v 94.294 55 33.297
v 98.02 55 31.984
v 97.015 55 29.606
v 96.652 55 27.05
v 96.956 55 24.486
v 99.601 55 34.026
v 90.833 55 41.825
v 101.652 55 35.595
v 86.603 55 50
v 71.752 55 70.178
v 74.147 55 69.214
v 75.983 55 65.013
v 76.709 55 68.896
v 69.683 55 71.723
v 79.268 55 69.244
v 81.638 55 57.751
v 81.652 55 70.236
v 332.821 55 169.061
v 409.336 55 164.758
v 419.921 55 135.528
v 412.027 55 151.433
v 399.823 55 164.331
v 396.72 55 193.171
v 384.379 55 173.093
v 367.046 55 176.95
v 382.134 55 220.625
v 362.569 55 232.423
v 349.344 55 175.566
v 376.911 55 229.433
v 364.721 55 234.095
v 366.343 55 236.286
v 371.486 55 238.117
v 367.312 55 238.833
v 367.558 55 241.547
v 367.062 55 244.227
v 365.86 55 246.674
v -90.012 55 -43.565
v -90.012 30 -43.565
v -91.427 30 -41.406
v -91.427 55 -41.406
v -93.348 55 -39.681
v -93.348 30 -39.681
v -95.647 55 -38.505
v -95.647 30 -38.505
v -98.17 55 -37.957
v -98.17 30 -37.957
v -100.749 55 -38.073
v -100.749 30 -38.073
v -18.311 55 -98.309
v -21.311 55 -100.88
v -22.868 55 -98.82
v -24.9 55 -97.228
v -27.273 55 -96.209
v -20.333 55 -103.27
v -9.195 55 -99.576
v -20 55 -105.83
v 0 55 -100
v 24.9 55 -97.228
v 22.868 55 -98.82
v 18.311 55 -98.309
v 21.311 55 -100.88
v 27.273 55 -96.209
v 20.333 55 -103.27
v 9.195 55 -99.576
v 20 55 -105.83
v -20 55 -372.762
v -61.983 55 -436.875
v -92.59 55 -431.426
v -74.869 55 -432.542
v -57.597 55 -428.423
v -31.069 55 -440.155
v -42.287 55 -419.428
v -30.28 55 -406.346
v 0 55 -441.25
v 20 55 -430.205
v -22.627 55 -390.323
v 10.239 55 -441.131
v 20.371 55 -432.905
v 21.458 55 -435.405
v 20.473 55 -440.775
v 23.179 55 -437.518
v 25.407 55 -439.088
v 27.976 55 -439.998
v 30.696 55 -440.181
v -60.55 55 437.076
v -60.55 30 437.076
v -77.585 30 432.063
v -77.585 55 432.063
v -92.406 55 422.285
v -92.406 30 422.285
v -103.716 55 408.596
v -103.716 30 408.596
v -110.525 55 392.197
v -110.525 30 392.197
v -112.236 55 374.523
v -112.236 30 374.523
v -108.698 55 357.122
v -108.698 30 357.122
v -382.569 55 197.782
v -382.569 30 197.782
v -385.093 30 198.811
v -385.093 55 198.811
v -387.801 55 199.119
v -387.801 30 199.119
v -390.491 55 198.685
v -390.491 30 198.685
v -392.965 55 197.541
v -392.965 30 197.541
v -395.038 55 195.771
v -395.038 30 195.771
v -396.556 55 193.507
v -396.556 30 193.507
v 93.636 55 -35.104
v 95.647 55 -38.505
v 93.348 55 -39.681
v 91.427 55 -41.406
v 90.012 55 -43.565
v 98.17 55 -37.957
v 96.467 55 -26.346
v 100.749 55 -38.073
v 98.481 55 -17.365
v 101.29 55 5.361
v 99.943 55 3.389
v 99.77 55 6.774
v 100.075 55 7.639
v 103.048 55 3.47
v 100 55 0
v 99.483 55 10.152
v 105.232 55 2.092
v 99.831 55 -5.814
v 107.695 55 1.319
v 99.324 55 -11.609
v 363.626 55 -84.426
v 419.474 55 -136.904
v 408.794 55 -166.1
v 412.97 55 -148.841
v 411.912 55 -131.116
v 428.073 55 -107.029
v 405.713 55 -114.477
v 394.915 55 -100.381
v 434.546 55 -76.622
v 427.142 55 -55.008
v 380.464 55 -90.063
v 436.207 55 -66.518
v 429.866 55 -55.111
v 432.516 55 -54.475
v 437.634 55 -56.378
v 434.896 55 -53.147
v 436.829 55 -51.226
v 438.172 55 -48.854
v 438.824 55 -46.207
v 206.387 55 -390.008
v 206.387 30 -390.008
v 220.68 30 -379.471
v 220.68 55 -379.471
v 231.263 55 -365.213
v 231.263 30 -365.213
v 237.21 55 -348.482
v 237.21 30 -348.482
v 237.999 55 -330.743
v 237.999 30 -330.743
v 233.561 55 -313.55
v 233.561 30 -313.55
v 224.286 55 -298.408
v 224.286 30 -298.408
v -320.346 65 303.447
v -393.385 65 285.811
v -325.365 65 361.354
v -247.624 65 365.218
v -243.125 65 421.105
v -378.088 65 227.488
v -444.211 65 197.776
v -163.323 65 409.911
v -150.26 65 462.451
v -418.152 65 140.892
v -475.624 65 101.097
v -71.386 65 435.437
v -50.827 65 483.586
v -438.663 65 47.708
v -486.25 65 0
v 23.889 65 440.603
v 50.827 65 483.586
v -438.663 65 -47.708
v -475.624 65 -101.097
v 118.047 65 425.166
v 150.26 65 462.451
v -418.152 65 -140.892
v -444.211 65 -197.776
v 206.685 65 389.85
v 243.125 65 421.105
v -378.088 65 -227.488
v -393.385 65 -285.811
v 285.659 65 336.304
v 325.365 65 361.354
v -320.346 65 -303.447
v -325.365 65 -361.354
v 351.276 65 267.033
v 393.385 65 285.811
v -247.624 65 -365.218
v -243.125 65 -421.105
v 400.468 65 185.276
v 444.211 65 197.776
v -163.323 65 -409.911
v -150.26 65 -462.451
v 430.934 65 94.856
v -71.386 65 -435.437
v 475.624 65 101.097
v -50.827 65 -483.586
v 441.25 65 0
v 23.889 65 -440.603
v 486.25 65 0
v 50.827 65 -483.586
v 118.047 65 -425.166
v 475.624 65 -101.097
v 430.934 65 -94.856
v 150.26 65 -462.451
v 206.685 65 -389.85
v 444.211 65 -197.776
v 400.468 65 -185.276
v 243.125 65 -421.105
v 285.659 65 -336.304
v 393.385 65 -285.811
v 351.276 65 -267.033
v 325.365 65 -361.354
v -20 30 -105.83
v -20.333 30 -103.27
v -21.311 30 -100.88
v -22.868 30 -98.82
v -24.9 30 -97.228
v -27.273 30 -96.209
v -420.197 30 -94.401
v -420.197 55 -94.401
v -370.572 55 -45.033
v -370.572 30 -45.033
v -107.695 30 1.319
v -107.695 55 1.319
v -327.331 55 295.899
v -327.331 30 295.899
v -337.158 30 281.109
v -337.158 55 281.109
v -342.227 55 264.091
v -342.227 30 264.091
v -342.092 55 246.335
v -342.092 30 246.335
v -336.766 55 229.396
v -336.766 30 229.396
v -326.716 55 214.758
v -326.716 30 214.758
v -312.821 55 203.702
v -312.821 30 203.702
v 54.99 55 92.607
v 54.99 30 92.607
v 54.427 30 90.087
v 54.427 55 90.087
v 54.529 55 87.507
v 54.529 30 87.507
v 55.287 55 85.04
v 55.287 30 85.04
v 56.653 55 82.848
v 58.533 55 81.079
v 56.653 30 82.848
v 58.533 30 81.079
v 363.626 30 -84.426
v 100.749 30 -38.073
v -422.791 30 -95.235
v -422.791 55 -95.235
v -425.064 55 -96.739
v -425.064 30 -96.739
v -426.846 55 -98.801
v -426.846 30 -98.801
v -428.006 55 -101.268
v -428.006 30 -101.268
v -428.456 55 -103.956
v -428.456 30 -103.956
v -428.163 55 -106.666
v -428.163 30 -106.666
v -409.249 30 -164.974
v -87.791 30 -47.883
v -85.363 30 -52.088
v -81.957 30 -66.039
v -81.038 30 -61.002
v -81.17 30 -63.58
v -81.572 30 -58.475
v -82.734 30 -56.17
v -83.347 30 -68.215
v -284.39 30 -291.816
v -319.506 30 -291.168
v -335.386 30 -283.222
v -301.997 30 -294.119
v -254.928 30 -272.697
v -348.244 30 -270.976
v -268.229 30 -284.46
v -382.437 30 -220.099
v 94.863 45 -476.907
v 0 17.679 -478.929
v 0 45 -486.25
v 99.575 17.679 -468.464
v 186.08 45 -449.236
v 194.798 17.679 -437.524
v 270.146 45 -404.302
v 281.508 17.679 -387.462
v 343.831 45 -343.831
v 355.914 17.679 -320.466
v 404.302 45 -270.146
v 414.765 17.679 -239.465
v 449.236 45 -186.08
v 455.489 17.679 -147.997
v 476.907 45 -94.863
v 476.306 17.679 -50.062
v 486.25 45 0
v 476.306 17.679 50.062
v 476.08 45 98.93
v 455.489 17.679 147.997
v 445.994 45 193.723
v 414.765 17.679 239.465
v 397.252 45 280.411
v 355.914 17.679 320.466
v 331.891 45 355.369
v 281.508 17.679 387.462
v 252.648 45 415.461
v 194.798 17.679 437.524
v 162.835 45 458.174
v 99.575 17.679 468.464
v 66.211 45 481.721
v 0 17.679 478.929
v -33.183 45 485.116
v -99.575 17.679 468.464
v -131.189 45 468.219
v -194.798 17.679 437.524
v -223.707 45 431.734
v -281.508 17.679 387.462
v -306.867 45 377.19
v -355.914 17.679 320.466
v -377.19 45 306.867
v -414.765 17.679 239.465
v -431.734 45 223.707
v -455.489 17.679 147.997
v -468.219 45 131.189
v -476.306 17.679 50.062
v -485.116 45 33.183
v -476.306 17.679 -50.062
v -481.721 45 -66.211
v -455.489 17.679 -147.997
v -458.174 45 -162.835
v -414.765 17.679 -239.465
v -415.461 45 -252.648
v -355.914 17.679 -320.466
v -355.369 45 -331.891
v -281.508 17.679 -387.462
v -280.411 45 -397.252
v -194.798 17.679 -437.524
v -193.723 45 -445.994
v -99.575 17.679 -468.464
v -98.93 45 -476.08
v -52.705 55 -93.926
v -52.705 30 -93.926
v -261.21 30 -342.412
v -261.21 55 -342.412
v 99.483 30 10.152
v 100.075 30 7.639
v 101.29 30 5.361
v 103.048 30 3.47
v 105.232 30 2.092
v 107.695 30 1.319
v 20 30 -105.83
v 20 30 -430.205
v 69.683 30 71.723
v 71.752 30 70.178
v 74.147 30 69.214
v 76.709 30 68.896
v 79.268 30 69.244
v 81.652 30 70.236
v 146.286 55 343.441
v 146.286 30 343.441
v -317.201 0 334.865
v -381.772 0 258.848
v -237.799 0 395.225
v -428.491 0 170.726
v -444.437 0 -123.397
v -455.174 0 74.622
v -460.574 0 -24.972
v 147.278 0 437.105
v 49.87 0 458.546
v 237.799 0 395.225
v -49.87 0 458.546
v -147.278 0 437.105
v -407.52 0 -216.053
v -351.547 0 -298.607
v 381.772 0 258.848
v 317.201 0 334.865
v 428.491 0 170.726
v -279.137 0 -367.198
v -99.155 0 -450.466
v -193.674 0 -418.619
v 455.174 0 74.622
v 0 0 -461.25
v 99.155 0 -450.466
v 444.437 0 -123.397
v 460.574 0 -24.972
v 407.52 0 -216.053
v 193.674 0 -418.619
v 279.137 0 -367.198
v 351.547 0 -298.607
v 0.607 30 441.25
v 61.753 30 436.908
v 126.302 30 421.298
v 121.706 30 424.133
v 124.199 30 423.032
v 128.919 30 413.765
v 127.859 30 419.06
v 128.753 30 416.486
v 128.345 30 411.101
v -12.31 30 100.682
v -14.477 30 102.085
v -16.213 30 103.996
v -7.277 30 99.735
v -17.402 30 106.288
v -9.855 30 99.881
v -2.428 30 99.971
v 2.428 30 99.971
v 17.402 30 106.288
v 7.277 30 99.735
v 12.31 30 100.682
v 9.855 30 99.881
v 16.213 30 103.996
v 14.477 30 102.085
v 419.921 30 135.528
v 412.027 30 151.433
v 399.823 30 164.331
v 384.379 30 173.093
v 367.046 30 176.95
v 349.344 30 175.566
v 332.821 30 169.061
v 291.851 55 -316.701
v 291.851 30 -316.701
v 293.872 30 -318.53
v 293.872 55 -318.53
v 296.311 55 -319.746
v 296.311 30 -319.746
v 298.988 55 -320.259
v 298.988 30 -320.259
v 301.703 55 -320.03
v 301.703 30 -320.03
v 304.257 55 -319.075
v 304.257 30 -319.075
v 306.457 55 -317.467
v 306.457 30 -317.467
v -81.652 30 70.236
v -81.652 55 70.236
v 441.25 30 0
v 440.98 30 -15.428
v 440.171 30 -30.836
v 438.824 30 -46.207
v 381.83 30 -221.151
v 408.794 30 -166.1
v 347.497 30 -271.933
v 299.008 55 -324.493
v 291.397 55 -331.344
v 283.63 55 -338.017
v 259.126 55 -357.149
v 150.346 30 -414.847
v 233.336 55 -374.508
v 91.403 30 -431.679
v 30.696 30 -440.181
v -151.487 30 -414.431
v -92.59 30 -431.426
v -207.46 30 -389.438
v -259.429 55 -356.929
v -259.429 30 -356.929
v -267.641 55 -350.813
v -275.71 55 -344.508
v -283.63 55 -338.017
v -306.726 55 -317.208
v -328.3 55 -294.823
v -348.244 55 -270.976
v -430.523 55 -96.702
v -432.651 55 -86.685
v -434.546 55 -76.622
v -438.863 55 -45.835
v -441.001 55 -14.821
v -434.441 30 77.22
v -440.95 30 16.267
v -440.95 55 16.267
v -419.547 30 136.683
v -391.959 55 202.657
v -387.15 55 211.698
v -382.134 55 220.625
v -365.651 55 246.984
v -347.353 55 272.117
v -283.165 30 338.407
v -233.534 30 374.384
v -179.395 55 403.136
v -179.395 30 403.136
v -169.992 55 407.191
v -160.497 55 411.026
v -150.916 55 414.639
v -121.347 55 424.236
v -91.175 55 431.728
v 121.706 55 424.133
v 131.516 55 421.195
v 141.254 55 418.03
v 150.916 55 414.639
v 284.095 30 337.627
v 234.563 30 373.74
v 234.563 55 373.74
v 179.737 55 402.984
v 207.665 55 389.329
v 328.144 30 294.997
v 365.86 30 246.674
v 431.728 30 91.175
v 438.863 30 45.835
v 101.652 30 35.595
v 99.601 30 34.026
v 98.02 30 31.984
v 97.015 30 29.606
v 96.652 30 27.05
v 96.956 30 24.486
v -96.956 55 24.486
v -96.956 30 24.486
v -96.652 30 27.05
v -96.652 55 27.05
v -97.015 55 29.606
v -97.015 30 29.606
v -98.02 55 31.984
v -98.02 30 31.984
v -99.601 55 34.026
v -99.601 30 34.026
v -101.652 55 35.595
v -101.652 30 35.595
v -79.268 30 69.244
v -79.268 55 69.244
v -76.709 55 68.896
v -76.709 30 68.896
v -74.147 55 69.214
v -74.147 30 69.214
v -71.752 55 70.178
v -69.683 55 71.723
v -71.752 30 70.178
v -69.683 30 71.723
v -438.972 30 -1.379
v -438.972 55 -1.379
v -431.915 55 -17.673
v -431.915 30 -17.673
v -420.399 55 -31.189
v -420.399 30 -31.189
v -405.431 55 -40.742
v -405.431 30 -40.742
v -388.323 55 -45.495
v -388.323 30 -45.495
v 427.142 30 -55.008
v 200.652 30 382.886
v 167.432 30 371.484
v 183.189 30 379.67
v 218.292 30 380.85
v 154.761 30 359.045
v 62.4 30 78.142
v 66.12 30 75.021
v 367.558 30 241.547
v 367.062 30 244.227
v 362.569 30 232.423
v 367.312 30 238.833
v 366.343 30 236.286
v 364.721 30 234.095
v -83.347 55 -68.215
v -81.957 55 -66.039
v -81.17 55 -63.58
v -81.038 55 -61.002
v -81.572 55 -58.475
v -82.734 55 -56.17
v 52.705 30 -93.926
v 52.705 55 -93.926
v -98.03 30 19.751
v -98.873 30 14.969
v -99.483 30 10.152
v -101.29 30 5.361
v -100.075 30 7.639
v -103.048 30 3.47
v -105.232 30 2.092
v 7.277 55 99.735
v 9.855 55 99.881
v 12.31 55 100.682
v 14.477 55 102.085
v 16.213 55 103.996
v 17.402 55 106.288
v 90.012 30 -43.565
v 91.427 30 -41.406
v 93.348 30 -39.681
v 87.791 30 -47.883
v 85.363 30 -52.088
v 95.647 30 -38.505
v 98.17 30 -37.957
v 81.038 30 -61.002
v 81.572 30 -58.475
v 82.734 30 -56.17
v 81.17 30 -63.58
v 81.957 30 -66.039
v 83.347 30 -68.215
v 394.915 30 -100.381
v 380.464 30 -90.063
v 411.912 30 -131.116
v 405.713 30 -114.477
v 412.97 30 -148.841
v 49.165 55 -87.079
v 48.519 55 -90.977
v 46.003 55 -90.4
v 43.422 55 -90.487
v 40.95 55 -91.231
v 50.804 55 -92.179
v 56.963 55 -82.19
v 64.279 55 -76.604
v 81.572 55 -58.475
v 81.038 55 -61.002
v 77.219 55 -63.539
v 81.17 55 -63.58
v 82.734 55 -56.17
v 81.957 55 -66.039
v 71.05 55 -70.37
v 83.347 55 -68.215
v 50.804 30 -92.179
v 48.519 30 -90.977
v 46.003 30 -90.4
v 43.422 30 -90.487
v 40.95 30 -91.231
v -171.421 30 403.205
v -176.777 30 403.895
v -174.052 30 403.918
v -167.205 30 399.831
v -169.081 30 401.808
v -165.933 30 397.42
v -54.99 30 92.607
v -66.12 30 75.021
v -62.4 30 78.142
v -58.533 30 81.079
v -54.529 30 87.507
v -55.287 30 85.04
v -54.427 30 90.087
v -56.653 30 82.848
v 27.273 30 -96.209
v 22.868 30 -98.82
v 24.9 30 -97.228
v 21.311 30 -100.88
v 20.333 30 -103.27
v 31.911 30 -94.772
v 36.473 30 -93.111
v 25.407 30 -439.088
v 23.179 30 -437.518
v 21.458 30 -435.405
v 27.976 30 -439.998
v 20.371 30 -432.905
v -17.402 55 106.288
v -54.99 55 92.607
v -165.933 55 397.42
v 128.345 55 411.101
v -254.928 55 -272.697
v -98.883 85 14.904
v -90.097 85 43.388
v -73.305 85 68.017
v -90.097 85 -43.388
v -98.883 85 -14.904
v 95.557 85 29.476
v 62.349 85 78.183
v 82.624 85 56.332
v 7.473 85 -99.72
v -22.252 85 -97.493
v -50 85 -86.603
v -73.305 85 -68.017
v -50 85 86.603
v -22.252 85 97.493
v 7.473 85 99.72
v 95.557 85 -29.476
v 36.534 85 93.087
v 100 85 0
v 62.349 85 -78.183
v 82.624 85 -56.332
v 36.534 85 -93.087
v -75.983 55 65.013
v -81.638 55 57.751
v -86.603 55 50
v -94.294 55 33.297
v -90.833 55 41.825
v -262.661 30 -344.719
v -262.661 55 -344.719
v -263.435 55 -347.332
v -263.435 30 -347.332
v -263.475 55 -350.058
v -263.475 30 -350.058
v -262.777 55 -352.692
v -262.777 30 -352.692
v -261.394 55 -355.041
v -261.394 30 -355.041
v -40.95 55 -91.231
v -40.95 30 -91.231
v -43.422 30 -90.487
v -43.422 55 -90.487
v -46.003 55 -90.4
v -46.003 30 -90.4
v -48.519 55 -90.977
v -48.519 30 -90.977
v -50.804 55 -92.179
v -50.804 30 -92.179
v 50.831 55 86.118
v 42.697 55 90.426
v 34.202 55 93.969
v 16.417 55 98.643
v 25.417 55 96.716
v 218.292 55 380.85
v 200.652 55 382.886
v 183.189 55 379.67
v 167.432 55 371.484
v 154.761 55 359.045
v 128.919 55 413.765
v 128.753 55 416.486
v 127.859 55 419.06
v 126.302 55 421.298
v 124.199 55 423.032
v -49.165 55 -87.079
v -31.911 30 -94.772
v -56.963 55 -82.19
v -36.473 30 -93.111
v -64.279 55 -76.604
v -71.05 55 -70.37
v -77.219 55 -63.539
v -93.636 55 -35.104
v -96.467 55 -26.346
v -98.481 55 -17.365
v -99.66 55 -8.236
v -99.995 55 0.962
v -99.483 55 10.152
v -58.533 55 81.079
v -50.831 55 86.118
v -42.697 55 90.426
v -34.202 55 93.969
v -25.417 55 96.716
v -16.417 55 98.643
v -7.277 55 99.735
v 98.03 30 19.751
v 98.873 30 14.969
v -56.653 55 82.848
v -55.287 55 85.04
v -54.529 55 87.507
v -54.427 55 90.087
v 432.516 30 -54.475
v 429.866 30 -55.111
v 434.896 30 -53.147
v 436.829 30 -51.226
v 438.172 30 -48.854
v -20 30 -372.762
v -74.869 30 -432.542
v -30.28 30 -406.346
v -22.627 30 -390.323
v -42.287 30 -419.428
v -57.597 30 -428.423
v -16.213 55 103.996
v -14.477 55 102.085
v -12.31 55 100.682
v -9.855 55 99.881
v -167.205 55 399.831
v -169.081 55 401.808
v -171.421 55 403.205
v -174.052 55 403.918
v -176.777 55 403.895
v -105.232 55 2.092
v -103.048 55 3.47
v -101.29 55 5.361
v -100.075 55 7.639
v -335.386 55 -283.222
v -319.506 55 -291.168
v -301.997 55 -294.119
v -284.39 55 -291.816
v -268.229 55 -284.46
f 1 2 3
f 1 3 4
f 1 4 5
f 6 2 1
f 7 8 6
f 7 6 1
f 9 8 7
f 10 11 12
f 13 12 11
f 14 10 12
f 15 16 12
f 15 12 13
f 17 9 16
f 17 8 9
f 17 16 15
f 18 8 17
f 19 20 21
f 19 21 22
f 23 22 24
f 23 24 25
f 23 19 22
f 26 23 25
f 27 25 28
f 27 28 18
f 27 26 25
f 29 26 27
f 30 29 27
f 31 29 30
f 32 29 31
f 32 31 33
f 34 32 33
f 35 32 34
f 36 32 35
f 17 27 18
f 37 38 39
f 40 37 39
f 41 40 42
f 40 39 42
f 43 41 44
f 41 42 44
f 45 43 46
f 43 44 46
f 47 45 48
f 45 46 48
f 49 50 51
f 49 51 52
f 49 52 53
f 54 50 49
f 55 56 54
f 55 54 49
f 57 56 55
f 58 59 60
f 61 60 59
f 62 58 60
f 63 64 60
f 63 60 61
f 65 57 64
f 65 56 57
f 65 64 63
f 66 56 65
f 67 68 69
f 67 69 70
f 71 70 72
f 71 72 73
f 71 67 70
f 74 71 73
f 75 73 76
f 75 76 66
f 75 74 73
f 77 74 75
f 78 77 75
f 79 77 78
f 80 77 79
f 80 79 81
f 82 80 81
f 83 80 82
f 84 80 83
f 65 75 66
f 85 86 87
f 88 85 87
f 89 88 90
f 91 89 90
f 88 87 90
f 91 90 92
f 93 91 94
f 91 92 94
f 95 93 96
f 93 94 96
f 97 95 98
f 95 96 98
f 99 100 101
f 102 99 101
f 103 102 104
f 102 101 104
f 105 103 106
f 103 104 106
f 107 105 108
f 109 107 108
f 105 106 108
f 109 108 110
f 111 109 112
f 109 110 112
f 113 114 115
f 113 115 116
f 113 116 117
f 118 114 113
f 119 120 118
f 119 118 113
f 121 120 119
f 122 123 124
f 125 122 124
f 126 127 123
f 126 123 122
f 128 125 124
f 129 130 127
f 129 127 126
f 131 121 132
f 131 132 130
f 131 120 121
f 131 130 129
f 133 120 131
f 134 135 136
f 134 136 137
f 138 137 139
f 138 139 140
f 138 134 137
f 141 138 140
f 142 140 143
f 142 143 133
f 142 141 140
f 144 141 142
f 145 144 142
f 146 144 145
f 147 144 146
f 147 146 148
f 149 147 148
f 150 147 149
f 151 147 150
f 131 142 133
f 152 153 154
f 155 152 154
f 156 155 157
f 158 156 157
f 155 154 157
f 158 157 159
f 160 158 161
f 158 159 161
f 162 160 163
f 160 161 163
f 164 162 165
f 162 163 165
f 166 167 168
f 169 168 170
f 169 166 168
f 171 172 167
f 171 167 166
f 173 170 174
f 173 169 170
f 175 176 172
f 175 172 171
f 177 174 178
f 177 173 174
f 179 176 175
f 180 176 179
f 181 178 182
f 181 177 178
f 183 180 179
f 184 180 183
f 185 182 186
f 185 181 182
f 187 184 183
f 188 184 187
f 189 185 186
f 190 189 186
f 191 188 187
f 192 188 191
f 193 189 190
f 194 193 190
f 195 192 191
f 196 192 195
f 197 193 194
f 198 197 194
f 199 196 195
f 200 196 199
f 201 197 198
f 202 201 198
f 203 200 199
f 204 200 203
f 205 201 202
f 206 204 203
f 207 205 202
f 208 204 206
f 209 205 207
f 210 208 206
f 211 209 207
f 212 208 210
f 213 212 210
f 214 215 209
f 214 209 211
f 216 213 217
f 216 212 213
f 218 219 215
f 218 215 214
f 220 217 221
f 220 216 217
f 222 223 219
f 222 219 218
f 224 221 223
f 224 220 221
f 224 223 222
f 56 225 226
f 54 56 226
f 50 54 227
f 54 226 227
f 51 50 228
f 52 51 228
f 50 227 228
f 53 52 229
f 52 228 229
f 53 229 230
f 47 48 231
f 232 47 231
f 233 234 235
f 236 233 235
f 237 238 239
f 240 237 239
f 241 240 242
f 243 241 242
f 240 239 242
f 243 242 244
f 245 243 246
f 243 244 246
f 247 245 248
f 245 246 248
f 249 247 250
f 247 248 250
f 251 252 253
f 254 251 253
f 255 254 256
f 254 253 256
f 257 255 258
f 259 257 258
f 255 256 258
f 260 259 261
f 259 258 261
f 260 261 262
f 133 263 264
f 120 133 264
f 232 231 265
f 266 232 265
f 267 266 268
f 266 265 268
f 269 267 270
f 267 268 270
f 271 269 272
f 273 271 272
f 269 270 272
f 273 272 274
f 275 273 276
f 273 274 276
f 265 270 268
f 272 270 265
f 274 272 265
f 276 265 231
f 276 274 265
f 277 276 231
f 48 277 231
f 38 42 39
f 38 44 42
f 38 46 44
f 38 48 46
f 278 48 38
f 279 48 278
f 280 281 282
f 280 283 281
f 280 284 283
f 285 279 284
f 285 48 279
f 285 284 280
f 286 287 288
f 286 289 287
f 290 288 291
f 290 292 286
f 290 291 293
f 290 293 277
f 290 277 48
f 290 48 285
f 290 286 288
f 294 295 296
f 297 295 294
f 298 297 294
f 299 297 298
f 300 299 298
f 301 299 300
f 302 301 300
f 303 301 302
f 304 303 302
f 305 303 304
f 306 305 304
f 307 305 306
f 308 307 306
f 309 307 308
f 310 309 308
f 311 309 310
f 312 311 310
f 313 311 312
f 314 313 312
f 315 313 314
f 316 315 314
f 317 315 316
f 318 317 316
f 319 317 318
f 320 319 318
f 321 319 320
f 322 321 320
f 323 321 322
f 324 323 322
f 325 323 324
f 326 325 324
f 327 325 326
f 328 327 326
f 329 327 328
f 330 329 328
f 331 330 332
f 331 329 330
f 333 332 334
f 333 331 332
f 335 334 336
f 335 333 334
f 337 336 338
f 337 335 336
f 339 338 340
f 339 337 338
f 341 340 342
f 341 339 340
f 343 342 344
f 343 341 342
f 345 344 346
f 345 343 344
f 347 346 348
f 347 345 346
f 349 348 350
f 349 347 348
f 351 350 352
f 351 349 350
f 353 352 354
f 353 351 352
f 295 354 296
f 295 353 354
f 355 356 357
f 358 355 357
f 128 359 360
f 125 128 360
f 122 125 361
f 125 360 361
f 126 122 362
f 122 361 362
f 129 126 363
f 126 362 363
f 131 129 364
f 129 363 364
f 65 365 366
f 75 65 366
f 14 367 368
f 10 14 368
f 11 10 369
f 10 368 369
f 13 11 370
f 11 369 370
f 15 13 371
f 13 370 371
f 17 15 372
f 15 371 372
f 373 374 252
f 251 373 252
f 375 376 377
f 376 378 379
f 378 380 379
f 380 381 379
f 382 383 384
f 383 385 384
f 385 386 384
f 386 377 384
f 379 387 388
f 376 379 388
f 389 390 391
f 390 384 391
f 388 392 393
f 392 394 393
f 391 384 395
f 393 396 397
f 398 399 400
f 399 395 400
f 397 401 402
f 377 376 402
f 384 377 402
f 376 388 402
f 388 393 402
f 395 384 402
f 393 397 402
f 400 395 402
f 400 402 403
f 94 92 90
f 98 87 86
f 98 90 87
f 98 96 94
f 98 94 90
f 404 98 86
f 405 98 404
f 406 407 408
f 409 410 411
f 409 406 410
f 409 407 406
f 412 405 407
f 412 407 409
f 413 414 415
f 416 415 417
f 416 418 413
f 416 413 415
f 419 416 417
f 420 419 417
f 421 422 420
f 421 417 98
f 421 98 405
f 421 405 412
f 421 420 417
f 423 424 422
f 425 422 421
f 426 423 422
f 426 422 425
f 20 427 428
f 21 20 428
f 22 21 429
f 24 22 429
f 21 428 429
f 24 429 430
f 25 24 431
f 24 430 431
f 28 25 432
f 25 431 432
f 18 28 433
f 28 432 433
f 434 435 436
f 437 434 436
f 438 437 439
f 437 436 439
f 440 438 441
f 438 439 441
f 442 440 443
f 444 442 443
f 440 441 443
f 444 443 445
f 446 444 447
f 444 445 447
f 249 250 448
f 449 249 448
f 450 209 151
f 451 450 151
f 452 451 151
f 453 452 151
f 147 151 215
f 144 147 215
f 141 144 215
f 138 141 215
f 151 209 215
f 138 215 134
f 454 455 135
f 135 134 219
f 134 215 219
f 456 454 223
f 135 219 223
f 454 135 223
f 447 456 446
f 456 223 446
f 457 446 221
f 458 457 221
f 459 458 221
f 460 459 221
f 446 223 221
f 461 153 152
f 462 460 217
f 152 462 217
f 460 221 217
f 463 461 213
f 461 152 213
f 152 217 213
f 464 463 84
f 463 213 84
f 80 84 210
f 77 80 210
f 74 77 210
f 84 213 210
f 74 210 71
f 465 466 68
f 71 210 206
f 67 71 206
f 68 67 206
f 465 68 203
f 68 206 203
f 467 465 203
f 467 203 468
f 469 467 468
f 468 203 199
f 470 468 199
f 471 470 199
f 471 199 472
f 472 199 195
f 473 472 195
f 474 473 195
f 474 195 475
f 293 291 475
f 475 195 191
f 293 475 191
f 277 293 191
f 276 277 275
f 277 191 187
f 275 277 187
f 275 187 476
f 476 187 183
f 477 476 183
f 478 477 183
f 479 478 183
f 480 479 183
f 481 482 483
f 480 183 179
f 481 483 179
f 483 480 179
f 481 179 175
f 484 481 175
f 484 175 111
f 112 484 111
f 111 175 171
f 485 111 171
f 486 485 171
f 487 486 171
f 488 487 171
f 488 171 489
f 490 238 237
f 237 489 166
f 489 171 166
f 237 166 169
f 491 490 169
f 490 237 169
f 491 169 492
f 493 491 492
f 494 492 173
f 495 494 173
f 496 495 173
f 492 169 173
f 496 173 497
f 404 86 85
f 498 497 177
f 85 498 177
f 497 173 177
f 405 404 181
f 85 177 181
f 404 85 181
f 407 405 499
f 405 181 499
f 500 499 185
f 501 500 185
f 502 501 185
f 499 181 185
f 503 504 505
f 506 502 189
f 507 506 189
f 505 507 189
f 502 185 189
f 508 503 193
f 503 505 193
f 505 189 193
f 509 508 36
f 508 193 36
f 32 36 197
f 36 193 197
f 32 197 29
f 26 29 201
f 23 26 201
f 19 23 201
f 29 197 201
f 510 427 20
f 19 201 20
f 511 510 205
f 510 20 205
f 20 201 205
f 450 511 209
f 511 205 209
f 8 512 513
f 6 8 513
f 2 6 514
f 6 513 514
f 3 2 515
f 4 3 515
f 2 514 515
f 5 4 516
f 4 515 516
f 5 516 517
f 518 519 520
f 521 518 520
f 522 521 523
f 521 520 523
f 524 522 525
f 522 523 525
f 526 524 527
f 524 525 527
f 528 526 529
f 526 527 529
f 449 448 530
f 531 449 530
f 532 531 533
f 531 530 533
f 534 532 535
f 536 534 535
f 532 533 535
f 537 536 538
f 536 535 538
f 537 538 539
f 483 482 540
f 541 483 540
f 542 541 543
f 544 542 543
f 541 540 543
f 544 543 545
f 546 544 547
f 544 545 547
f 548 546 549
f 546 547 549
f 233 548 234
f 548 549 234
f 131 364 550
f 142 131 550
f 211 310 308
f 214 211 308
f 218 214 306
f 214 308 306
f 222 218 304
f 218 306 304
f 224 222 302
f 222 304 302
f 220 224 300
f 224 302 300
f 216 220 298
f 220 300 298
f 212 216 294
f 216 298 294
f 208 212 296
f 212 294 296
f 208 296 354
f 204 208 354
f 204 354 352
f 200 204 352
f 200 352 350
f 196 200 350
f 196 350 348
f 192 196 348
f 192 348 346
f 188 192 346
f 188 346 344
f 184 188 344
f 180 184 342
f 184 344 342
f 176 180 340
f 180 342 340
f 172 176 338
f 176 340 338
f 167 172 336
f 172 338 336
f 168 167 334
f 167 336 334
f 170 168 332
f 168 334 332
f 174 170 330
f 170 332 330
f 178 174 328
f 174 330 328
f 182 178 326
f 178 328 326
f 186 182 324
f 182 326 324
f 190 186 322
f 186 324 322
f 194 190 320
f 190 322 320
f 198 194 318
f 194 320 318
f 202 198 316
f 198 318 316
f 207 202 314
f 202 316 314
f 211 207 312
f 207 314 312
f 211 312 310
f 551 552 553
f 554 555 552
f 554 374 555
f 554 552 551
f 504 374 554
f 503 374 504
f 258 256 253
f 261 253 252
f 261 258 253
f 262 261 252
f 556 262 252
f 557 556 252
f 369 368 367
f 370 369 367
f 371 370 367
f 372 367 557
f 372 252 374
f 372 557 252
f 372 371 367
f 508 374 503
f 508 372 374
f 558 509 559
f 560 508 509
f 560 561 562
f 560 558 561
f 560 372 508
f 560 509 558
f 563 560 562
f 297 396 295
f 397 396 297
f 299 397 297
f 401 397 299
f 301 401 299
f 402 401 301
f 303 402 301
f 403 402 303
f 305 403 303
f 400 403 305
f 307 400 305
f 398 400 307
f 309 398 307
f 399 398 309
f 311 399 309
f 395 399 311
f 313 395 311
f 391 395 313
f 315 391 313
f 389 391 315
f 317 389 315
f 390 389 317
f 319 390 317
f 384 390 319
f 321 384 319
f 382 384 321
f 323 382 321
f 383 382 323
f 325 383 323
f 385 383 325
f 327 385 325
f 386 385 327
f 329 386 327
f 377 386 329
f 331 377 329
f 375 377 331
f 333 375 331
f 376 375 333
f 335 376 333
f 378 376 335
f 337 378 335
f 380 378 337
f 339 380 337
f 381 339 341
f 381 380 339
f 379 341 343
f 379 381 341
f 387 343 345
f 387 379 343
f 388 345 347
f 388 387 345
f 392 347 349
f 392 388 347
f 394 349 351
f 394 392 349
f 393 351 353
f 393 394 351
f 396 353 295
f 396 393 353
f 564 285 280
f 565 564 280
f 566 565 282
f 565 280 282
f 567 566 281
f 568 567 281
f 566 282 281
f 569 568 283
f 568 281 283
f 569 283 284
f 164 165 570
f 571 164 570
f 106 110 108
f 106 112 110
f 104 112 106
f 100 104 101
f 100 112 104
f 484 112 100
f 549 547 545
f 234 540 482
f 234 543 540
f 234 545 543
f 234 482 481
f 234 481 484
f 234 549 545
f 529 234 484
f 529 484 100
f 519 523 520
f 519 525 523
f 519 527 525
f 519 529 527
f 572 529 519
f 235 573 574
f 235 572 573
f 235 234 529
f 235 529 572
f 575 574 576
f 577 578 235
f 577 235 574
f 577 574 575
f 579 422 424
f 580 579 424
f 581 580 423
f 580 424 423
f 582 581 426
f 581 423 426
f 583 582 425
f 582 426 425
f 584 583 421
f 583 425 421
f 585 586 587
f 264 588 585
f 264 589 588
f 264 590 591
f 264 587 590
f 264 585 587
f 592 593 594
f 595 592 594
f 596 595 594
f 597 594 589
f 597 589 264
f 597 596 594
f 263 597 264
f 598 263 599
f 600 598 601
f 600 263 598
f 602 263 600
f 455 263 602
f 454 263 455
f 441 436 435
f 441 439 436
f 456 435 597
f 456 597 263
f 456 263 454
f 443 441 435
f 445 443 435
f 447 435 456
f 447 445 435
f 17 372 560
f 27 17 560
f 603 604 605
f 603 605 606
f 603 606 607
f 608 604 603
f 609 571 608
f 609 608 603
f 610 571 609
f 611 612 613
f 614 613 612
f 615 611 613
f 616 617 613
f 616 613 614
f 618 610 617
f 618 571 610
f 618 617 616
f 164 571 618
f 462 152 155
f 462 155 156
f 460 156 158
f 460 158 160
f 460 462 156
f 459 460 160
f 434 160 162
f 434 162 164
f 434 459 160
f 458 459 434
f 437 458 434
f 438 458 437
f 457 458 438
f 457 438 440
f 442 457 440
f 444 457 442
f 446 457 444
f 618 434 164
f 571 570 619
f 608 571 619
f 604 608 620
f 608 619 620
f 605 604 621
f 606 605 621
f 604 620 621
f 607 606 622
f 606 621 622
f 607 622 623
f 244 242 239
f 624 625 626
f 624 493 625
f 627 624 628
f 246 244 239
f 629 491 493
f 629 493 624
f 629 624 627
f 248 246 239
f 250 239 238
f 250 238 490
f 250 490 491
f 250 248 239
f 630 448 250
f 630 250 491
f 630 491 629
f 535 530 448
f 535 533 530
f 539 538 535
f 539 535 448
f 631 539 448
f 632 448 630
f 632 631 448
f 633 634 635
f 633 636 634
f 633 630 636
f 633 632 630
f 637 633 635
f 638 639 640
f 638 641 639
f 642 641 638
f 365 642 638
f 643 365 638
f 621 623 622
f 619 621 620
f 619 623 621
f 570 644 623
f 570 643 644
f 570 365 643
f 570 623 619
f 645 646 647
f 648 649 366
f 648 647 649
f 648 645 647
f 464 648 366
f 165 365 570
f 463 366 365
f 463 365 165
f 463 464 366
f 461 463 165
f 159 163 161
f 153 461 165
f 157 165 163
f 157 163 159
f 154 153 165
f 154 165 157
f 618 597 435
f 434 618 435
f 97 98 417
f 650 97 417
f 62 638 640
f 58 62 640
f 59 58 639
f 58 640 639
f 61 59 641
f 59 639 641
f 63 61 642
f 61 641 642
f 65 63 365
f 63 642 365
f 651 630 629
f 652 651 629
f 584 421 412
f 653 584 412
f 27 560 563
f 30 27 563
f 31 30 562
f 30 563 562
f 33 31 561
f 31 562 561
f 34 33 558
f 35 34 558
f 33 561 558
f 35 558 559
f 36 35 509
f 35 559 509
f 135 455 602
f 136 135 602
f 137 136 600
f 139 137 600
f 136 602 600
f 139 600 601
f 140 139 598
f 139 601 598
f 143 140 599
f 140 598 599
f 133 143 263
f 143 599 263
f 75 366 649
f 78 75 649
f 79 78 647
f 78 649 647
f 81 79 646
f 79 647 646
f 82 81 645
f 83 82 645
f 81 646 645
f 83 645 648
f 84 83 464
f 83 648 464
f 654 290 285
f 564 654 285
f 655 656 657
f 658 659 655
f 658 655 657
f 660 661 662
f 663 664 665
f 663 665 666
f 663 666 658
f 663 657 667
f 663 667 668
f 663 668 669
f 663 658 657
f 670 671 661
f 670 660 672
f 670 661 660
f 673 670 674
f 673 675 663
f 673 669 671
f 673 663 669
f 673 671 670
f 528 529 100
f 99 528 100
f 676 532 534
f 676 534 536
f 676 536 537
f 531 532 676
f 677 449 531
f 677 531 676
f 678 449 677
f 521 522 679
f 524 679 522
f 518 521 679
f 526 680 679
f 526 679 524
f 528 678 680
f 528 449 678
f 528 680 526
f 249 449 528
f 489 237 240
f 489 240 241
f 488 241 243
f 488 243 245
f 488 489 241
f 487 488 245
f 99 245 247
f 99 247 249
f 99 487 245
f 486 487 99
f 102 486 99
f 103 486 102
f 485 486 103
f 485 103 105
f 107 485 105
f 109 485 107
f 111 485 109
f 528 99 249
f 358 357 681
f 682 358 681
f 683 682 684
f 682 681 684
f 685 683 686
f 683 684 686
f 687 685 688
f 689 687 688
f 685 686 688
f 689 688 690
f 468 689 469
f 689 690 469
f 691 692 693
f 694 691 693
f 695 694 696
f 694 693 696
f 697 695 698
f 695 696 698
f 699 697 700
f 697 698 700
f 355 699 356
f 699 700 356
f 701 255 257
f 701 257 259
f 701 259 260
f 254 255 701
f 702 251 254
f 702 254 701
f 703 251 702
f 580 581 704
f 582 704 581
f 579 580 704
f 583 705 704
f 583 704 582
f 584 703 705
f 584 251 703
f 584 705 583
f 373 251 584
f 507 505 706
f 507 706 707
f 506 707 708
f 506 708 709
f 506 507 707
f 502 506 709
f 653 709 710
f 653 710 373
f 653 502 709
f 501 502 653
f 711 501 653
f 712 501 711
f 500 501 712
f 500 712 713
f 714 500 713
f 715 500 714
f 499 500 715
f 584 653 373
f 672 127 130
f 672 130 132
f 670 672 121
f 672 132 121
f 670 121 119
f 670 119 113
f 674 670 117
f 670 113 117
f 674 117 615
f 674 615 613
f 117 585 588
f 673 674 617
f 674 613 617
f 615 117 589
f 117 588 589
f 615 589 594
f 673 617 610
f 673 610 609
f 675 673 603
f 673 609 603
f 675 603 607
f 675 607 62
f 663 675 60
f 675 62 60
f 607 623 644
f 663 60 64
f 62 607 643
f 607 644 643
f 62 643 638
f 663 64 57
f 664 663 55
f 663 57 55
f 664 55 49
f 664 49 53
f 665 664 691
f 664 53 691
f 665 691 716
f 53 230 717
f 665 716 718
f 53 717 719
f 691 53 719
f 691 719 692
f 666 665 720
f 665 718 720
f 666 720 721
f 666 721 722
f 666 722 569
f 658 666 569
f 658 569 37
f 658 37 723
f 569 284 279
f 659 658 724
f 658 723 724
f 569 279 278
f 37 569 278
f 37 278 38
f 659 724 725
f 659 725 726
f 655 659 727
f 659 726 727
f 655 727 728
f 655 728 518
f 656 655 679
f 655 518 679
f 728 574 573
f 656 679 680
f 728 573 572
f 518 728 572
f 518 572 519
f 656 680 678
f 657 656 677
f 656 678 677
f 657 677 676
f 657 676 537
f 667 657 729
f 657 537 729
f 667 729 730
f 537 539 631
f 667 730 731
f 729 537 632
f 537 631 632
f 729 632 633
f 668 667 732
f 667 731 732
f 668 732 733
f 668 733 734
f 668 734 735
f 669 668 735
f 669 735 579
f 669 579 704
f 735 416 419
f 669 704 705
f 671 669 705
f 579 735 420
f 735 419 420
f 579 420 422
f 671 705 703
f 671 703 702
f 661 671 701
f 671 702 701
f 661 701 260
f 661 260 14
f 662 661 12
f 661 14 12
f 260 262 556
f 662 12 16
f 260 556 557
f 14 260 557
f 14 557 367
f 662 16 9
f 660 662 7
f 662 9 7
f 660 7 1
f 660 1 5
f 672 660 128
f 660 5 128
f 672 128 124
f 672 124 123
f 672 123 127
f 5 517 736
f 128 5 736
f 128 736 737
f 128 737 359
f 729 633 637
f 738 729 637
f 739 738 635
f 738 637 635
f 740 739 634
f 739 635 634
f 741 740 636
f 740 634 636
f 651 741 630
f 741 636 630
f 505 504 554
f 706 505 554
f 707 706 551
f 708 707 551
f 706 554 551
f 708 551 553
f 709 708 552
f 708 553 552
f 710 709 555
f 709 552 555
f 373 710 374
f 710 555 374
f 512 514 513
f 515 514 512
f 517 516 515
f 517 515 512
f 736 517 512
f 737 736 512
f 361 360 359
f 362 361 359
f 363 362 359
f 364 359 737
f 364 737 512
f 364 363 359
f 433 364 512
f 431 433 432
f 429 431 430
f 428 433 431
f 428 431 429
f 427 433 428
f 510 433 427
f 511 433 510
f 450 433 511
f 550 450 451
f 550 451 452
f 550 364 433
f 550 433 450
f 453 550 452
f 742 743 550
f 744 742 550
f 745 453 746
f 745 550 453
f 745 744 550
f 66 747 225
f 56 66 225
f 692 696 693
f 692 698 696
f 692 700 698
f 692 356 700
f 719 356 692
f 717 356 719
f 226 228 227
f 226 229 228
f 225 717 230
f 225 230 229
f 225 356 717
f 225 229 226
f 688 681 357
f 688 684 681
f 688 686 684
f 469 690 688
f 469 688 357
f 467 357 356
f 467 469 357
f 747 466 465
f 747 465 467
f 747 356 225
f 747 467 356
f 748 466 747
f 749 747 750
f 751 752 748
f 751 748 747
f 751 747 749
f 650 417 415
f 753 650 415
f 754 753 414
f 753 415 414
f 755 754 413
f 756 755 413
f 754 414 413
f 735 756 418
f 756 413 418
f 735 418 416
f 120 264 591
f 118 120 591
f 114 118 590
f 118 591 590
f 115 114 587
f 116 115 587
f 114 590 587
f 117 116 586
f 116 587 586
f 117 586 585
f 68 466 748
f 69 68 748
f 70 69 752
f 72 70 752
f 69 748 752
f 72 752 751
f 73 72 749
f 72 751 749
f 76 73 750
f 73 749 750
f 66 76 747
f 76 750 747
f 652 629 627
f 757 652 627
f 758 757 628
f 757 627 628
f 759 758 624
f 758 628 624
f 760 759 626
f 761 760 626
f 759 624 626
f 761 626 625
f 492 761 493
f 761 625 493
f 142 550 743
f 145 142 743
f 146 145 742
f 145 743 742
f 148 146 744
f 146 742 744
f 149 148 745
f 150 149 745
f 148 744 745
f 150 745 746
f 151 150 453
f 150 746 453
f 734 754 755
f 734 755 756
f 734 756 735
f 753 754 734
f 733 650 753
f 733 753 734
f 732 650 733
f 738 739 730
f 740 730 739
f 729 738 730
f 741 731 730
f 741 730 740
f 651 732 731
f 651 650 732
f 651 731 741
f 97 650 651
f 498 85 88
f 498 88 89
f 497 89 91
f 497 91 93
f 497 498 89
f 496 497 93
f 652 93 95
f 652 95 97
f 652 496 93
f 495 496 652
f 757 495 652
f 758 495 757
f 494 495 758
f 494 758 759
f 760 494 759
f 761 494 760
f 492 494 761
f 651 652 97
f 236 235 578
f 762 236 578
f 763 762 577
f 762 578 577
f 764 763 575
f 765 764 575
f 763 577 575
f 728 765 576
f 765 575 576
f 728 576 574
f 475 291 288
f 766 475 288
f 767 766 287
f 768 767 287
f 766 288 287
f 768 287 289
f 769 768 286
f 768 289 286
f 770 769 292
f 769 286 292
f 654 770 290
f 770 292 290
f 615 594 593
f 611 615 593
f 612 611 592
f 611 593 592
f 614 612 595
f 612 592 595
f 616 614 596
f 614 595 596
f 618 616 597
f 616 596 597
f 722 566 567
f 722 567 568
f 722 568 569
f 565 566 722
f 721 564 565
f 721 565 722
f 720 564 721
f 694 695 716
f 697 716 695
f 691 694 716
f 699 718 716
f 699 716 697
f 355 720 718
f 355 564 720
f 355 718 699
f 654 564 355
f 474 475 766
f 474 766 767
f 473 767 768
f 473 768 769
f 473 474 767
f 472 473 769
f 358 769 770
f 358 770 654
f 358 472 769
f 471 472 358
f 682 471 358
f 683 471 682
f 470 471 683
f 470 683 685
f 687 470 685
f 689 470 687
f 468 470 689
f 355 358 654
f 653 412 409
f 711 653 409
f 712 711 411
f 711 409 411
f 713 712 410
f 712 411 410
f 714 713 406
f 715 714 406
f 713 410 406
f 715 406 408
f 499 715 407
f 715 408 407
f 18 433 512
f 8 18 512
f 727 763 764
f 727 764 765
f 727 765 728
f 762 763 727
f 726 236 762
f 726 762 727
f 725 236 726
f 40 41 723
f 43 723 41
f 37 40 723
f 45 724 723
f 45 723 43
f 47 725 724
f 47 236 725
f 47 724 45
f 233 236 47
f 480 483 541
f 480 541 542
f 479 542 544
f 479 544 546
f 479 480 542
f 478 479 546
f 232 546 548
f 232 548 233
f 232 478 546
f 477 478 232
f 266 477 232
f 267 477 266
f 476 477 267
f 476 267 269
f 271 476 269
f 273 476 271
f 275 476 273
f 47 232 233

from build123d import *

# Parameters (mm, degrees)
SKETCH1_R           = 486.25
BOSS_EXTRUDE1_DEPTH = 65
SKETCH3_R           = 441.25
CUT_EXTRUDE1_DEPTH  = 35
SKETCH6_R           = 100
BOSS_EXTRUDE3_DEPTH = 55
BOSS_EXTRUDE4_DEPTH = 25
CIRPATTERN1_COUNT   = 9


with BuildPart() as part:
    # Sketch1 → Boss-Extrude1 (new body)
    with BuildSketch(Plane(origin=(0, 0, 0), x_dir=(1, 0, 0), z_dir=(0, 1, 0))):
        Circle(SKETCH1_R)
    extrude(amount=BOSS_EXTRUDE1_DEPTH)

    # Sketch3 → Cut-Extrude1 (cut)
    with BuildSketch(Plane(origin=(0, 65, 0), x_dir=(1, 0, 0), z_dir=(0, 1, 0))):
        Circle(SKETCH3_R)
    extrude(amount=-CUT_EXTRUDE1_DEPTH, mode=Mode.SUBTRACT)

    # Sketch5 → Cut-Revolve1 (revolve, cut)
    with BuildSketch(Plane(origin=(0, 0, 0), x_dir=(0, 0, -1), z_dir=(1, 0, 0))):
        Polygon((486.25, 45), (478.929491924, 17.679491924), (461.25, 0), (486.25, 0), align=None)
    revolve(axis=Axis((0, 89.25, 0), (0, -1, 0)), mode=Mode.SUBTRACT)

    # Sketch6 → Boss-Extrude3 (add)
    with BuildSketch(Plane(origin=(0, 30, 0), x_dir=(1, 0, 0), z_dir=(0, 1, 0))):
        Circle(SKETCH6_R)
    extrude(amount=BOSS_EXTRUDE3_DEPTH)

    # Sketch7 → Boss-Extrude4 (add)
    with BuildSketch(Plane(origin=(0, 30, 0), x_dir=(1, 0, 0), z_dir=(0, 1, 0))):
        with BuildLine():
            Line((0, 441.25), (0, 100))
            ThreePointArc((0, 100), (13.767464211, 99.047750753), (27.272727273, 96.209138584))
            ThreePointArc((27.272727273, 96.209138584), (22.022759648, 99.799825551), (20, 105.830052443))
            Line((20, 105.830052443), (20, 430.205256244))
            ThreePointArc((20, 430.205256244), (23.179315347, 437.518139456), (30.695652174, 440.181030302))
            ThreePointArc((30.695652174, 440.181030302), (15.357129929, 440.982676599), (0, 441.25))
        make_face()
        with BuildLine():
            Line((-20, 372.762072239), (-20, 105.830052443))
            ThreePointArc((-20, 105.830052443), (-22.022759648, 99.799825551), (-27.272727273, 96.209138584))
            ThreePointArc((-27.272727273, 96.209138584), (-13.767464211, 99.047750753), (0, 100))
            Line((0, 100), (0, 441.25))
            ThreePointArc((0, 441.25), (-46.554925044, 438.787193813), (-92.590163934, 431.426267214))
            ThreePointArc((-92.590163934, 431.426267214), (-42.286672356, 419.427958259), (-20, 372.762072239))
        make_face()
    boss_extrude4 = extrude(amount=BOSS_EXTRUDE4_DEPTH)

    # CirPattern1: Boss-Extrude4 ×9 about axis
    cirpattern1_axis = Axis((0, 0, 0), (0, 1, 0))
    for i in range(1, CIRPATTERN1_COUNT):
        add(boss_extrude4.rotate(cirpattern1_axis, i * 360 / CIRPATTERN1_COUNT))


solid = part.part
